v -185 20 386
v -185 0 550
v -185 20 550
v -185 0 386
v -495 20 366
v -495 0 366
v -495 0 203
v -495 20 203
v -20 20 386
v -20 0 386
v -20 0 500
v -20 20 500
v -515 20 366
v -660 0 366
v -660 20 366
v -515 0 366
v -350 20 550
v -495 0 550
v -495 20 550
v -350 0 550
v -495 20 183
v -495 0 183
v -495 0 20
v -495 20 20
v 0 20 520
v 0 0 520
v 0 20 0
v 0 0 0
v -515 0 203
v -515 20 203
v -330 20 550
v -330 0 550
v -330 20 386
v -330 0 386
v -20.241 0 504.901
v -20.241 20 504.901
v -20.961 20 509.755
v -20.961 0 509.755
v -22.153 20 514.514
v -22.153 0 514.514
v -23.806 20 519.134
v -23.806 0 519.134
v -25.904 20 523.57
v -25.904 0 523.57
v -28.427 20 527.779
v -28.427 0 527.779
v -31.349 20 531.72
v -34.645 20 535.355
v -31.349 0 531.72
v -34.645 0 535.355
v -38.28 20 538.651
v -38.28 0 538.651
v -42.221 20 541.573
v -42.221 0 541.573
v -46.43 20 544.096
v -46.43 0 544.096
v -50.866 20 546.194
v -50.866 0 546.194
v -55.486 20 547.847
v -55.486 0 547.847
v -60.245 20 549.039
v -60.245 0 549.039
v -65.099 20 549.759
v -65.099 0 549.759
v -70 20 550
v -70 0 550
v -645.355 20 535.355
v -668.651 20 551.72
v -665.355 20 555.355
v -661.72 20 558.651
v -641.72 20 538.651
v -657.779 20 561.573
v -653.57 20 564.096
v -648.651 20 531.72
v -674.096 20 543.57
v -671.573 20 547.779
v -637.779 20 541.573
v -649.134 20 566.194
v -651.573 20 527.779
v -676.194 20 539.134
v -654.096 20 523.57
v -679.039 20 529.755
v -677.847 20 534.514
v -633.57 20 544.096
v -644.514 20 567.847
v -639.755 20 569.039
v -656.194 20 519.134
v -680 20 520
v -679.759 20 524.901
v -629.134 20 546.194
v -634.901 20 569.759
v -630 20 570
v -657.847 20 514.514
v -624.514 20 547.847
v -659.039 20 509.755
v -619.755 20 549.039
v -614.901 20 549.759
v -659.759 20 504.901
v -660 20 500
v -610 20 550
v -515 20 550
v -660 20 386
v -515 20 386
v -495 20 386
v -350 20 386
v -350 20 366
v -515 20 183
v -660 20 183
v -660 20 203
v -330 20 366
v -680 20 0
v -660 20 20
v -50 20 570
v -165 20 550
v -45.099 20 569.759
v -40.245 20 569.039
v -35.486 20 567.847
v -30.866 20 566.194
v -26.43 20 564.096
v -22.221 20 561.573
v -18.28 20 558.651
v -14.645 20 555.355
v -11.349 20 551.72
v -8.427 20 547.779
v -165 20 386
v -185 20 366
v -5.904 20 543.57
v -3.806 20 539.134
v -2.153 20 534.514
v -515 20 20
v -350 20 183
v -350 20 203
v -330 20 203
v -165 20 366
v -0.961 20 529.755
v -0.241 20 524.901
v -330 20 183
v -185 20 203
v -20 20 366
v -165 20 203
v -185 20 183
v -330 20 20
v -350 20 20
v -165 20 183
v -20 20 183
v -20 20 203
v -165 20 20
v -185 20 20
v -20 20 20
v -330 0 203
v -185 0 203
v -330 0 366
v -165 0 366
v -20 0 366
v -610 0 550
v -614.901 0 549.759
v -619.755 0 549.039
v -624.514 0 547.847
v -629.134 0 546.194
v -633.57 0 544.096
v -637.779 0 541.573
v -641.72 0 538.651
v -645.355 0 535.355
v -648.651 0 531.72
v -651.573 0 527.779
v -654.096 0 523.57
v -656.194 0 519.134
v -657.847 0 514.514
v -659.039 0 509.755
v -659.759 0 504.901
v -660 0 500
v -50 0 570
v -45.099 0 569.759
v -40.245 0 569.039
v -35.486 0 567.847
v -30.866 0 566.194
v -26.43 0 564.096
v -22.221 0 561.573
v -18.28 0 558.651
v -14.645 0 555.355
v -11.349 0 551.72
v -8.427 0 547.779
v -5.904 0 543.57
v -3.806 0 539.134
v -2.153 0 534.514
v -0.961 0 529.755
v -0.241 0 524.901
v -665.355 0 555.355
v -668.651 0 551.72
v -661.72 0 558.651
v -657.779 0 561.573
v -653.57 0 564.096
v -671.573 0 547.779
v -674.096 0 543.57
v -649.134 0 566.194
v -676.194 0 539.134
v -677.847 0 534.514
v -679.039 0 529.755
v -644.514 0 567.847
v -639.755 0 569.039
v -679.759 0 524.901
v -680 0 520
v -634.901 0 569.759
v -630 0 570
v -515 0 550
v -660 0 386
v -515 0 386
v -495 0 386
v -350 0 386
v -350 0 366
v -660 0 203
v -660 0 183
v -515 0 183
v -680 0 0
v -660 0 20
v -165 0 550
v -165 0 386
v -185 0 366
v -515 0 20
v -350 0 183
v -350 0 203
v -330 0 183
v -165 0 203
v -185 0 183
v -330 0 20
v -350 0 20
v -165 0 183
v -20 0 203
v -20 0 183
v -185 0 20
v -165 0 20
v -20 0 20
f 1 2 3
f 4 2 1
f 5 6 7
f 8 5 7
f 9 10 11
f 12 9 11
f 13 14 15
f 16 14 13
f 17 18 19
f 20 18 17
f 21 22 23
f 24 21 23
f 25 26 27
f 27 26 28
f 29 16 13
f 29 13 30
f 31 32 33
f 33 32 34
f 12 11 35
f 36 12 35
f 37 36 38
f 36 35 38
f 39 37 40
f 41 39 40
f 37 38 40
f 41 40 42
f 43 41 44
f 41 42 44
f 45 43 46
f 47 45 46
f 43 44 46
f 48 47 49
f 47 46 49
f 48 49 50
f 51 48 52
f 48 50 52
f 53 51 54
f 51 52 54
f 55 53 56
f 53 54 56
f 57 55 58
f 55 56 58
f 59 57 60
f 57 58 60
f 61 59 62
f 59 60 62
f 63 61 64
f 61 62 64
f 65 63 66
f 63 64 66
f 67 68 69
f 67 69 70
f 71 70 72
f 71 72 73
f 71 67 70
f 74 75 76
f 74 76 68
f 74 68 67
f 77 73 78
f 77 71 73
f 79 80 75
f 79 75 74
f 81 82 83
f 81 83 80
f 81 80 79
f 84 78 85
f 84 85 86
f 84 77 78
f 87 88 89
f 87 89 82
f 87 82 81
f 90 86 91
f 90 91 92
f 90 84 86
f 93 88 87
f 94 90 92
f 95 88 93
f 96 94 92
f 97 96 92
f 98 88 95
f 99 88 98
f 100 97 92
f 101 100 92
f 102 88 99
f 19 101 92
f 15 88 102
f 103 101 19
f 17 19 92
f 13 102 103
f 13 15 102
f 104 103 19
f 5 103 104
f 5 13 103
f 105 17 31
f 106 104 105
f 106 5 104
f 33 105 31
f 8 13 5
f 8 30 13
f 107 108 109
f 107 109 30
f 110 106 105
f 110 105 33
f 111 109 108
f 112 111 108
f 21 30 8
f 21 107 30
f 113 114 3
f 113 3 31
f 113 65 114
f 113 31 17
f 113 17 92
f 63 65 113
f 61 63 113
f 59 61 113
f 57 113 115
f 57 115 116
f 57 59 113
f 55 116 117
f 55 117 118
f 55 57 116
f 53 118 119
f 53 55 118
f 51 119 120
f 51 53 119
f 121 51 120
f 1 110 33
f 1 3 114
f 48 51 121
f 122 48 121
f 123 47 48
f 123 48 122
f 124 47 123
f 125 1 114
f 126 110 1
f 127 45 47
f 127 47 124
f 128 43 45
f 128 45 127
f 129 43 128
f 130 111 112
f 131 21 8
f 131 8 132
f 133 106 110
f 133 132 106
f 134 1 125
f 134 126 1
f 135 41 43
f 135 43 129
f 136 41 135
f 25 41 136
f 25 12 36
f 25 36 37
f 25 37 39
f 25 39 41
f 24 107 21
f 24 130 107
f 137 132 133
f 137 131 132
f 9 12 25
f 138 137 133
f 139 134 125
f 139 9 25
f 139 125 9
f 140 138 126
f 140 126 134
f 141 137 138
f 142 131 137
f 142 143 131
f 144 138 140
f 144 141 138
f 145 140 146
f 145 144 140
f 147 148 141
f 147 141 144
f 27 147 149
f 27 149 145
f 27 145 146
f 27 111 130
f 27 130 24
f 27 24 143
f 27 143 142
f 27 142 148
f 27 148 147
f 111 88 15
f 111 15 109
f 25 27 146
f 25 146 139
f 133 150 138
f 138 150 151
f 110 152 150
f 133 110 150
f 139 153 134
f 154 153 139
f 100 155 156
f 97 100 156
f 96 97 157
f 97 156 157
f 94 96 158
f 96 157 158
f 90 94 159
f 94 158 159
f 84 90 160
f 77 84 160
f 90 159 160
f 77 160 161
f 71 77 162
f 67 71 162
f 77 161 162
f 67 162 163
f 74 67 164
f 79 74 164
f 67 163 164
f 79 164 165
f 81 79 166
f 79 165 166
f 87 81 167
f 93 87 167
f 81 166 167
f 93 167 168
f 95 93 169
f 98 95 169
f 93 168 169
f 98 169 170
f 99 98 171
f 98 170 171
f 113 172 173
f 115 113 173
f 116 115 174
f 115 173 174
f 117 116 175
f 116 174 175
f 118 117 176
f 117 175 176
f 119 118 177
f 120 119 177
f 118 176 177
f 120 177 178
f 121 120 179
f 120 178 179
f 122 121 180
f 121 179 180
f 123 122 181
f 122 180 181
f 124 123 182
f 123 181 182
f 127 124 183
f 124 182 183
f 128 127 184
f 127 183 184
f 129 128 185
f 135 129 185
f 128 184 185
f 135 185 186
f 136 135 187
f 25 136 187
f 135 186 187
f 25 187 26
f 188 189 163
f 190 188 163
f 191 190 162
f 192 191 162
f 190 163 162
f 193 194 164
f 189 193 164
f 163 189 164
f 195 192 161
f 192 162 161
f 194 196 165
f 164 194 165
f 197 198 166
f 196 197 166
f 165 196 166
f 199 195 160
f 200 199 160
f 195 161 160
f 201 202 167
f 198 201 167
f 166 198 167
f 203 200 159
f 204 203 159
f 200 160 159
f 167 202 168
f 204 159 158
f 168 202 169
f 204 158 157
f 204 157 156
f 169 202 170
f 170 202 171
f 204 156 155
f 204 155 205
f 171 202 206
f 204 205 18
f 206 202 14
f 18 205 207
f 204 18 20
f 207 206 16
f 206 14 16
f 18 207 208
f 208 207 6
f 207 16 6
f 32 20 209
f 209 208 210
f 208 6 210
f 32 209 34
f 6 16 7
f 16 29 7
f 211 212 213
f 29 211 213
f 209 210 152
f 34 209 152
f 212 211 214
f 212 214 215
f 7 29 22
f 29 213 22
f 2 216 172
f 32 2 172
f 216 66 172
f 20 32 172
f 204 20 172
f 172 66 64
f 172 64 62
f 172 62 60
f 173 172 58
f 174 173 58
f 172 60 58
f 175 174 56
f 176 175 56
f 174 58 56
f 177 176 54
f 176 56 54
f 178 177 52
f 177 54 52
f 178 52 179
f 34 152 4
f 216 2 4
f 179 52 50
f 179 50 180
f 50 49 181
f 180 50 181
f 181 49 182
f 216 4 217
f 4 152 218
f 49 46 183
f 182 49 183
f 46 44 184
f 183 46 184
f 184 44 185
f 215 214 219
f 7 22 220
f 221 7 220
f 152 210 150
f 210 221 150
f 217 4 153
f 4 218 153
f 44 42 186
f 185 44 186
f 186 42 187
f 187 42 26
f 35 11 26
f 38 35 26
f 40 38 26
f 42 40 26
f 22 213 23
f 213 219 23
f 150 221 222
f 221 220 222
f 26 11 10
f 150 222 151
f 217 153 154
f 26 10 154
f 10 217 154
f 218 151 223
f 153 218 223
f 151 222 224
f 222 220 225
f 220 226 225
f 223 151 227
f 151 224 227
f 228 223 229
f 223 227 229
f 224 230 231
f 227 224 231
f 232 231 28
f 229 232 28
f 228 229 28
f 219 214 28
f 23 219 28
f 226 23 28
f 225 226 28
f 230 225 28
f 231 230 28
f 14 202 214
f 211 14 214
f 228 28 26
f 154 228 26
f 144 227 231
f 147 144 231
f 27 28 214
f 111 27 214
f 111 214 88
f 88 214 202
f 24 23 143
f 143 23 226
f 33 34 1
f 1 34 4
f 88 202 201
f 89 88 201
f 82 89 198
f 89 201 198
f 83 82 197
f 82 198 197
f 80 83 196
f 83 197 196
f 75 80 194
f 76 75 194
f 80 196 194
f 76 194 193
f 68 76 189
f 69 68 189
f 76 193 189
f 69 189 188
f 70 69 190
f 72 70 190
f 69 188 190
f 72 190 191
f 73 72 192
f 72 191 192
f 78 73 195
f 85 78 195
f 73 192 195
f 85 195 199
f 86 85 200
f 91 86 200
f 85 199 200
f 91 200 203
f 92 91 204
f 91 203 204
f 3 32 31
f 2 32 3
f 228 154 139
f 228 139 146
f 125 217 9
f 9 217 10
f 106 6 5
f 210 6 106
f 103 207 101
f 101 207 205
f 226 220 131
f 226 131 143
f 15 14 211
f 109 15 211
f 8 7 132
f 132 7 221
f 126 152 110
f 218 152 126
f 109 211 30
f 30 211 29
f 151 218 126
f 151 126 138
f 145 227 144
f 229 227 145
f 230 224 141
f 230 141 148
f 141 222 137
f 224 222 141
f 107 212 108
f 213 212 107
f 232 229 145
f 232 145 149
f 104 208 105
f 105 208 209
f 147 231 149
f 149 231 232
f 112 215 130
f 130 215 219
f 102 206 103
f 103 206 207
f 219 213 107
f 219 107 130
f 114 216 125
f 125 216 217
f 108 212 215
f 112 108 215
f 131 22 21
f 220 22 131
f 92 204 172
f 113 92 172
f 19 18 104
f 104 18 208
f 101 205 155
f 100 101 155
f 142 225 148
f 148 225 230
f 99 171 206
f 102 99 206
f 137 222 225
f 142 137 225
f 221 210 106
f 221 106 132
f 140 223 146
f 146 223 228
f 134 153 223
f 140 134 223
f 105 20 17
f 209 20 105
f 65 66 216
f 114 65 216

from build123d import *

# Parameters (mm, degrees)
SKETCH1_W   = 145
SKETCH1_H   = 163
SKETCH1_H_2 = 164
BAGA_DEPTH  = 20


with BuildPart() as part:
    # Sketch1 → baga (new body)
    with BuildSketch(Plane(origin=(0, 0, 0), x_dir=(1, 0, 0), z_dir=(0, 1, 0))):
        with BuildLine():
            Line((0, 0), (-680, 0))
            Line((-680, 0), (-680, -520))
            ThreePointArc((-680, -520), (-665.355339059, -555.355339059), (-630, -570))
            Line((-630, -570), (-50, -570))
            ThreePointArc((-50, -570), (-14.644660941, -555.355339059), (0, -520))
            Line((0, -520), (0, 0))
        make_face()
        with Locations((-587.5, -284.5)):
            Rectangle(SKETCH1_W, SKETCH1_H, mode=Mode.SUBTRACT)
        with Locations((-92.5, -101.5)):
            Rectangle(SKETCH1_W, SKETCH1_H, mode=Mode.SUBTRACT)
        with BuildLine():
            Line((-70, -550), (-165, -550))
            Line((-165, -550), (-165, -386))
            Line((-165, -386), (-20, -386))
            Line((-20, -386), (-20, -500))
            ThreePointArc((-20, -500), (-34.644660941, -535.355339059), (-70, -550))
        make_face(mode=Mode.SUBTRACT)
        with Locations((-587.5, -101.5)):
            Rectangle(SKETCH1_W, SKETCH1_H, mode=Mode.SUBTRACT)
        with BuildLine():
            Line((-660, -386), (-515, -386))
            Line((-515, -386), (-515, -550))
            Line((-515, -550), (-610, -550))
            ThreePointArc((-610, -550), (-645.355339059, -535.355339059), (-660, -500))
            Line((-660, -500), (-660, -386))
        make_face(mode=Mode.SUBTRACT)
        with Locations((-422.5, -101.5)):
            Rectangle(SKETCH1_W, SKETCH1_H, mode=Mode.SUBTRACT)
        with Locations((-257.5, -101.5)):
            Rectangle(SKETCH1_W, SKETCH1_H, mode=Mode.SUBTRACT)
        with Locations((-422.5, -284.5)):
            Rectangle(SKETCH1_W, SKETCH1_H, mode=Mode.SUBTRACT)
        with Locations((-257.5, -284.5)):
            Rectangle(SKETCH1_W, SKETCH1_H, mode=Mode.SUBTRACT)
        with Locations((-92.5, -284.5)):
            Rectangle(SKETCH1_W, SKETCH1_H, mode=Mode.SUBTRACT)
        with Locations((-422.5, -468)):
            Rectangle(SKETCH1_W, SKETCH1_H_2, mode=Mode.SUBTRACT)
        with Locations((-257.5, -468)):
            Rectangle(SKETCH1_W, SKETCH1_H_2, mode=Mode.SUBTRACT)
    extrude(amount=BAGA_DEPTH)


solid = part.part
